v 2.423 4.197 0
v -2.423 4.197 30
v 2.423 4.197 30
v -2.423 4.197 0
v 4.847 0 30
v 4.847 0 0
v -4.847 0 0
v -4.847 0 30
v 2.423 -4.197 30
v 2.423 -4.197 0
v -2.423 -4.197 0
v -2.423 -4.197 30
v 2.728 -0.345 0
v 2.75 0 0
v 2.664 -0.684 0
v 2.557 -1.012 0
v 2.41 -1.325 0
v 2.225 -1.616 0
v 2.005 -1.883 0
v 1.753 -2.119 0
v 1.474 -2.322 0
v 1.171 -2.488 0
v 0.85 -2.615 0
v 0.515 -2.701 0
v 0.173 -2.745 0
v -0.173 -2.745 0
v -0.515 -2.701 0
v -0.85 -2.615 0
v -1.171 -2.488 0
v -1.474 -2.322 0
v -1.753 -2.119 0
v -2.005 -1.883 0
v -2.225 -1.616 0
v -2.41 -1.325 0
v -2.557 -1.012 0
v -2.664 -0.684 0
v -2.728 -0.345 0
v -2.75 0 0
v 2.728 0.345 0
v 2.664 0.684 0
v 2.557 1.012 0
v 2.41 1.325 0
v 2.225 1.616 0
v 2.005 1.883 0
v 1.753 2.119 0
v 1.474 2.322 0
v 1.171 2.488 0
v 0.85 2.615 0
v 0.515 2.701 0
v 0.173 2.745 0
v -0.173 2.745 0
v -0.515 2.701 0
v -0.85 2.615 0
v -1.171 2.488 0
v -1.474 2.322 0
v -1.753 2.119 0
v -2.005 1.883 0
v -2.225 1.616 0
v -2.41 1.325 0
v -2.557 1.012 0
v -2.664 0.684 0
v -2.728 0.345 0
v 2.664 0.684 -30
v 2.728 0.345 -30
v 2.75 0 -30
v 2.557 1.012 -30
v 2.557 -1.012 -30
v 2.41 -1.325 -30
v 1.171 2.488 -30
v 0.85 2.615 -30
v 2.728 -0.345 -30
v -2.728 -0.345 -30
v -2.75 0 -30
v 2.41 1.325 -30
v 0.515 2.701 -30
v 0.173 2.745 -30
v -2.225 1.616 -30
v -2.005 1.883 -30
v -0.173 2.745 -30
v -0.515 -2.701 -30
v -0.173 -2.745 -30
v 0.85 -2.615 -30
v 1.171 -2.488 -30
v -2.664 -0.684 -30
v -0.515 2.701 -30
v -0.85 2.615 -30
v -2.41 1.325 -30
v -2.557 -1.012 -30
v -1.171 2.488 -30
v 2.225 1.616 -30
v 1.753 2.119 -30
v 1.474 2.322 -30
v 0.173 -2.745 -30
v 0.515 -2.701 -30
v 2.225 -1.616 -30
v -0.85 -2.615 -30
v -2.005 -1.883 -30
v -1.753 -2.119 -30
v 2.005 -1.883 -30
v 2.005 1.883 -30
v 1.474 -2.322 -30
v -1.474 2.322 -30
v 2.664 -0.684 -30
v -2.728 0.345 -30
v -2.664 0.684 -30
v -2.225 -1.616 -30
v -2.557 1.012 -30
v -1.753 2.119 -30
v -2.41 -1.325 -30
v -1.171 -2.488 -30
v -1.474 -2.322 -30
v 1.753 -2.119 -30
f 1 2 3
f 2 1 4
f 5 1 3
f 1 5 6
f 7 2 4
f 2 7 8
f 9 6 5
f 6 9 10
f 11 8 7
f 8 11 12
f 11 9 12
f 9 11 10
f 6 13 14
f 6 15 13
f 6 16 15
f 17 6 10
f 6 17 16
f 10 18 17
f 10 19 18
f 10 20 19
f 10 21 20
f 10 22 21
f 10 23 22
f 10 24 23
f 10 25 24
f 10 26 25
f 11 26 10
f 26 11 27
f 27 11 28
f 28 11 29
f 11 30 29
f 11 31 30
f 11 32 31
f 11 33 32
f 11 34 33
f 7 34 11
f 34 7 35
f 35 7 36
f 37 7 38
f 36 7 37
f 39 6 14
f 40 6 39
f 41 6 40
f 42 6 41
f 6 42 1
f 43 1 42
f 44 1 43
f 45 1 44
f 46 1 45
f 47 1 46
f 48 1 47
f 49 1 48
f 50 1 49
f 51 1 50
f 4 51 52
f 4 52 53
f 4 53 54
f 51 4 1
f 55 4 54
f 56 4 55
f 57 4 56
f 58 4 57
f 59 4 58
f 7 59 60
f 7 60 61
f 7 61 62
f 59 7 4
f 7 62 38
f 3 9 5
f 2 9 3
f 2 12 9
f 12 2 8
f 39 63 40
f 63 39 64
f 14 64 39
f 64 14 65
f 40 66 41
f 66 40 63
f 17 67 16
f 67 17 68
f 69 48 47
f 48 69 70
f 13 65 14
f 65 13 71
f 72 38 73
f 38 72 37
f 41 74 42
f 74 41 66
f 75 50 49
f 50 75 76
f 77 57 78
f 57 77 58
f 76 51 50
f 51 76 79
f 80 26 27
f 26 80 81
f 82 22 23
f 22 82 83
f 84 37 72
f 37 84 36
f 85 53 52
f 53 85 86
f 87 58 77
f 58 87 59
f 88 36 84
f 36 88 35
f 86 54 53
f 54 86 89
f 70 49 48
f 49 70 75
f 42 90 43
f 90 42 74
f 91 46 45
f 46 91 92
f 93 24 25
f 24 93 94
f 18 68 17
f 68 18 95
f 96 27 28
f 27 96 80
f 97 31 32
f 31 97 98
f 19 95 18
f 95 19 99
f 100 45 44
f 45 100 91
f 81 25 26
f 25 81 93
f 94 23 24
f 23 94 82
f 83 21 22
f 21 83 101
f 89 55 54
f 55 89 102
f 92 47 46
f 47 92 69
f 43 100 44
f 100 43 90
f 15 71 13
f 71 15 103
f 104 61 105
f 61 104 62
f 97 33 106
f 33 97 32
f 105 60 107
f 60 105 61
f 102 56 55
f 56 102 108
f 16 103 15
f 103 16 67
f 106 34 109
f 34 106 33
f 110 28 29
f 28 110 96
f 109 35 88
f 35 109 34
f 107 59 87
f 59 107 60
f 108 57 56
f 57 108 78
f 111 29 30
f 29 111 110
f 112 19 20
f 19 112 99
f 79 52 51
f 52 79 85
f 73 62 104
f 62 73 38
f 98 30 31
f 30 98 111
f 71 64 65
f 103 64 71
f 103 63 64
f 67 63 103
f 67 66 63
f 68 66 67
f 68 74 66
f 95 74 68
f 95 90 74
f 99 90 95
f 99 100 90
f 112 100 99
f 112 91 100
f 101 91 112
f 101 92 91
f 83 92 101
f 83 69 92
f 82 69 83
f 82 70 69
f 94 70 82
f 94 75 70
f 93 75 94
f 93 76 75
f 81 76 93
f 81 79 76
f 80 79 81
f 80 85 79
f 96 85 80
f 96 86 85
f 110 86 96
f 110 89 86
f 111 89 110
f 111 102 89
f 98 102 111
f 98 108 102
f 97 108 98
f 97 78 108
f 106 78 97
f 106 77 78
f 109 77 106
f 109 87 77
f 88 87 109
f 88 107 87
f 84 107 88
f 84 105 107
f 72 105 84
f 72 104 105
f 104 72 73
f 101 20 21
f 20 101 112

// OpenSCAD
$fn = 50;


difference() {
	union() {
		linear_extrude(height = 30) {
			polygon(points = [[4.8468000000, 0.0000000000], [2.4234000000, 4.1974519271], [-2.4234000000, 4.1974519271], [-4.8468000000, 0.0000000000], [-2.4234000000, -4.1974519271], [2.4234000000, -4.1974519271]]);
		}
		translate(v = [0, 0, -30]) {
			cylinder(h = 30, r = 2.7500000000);
		}
	}
	union();
}
